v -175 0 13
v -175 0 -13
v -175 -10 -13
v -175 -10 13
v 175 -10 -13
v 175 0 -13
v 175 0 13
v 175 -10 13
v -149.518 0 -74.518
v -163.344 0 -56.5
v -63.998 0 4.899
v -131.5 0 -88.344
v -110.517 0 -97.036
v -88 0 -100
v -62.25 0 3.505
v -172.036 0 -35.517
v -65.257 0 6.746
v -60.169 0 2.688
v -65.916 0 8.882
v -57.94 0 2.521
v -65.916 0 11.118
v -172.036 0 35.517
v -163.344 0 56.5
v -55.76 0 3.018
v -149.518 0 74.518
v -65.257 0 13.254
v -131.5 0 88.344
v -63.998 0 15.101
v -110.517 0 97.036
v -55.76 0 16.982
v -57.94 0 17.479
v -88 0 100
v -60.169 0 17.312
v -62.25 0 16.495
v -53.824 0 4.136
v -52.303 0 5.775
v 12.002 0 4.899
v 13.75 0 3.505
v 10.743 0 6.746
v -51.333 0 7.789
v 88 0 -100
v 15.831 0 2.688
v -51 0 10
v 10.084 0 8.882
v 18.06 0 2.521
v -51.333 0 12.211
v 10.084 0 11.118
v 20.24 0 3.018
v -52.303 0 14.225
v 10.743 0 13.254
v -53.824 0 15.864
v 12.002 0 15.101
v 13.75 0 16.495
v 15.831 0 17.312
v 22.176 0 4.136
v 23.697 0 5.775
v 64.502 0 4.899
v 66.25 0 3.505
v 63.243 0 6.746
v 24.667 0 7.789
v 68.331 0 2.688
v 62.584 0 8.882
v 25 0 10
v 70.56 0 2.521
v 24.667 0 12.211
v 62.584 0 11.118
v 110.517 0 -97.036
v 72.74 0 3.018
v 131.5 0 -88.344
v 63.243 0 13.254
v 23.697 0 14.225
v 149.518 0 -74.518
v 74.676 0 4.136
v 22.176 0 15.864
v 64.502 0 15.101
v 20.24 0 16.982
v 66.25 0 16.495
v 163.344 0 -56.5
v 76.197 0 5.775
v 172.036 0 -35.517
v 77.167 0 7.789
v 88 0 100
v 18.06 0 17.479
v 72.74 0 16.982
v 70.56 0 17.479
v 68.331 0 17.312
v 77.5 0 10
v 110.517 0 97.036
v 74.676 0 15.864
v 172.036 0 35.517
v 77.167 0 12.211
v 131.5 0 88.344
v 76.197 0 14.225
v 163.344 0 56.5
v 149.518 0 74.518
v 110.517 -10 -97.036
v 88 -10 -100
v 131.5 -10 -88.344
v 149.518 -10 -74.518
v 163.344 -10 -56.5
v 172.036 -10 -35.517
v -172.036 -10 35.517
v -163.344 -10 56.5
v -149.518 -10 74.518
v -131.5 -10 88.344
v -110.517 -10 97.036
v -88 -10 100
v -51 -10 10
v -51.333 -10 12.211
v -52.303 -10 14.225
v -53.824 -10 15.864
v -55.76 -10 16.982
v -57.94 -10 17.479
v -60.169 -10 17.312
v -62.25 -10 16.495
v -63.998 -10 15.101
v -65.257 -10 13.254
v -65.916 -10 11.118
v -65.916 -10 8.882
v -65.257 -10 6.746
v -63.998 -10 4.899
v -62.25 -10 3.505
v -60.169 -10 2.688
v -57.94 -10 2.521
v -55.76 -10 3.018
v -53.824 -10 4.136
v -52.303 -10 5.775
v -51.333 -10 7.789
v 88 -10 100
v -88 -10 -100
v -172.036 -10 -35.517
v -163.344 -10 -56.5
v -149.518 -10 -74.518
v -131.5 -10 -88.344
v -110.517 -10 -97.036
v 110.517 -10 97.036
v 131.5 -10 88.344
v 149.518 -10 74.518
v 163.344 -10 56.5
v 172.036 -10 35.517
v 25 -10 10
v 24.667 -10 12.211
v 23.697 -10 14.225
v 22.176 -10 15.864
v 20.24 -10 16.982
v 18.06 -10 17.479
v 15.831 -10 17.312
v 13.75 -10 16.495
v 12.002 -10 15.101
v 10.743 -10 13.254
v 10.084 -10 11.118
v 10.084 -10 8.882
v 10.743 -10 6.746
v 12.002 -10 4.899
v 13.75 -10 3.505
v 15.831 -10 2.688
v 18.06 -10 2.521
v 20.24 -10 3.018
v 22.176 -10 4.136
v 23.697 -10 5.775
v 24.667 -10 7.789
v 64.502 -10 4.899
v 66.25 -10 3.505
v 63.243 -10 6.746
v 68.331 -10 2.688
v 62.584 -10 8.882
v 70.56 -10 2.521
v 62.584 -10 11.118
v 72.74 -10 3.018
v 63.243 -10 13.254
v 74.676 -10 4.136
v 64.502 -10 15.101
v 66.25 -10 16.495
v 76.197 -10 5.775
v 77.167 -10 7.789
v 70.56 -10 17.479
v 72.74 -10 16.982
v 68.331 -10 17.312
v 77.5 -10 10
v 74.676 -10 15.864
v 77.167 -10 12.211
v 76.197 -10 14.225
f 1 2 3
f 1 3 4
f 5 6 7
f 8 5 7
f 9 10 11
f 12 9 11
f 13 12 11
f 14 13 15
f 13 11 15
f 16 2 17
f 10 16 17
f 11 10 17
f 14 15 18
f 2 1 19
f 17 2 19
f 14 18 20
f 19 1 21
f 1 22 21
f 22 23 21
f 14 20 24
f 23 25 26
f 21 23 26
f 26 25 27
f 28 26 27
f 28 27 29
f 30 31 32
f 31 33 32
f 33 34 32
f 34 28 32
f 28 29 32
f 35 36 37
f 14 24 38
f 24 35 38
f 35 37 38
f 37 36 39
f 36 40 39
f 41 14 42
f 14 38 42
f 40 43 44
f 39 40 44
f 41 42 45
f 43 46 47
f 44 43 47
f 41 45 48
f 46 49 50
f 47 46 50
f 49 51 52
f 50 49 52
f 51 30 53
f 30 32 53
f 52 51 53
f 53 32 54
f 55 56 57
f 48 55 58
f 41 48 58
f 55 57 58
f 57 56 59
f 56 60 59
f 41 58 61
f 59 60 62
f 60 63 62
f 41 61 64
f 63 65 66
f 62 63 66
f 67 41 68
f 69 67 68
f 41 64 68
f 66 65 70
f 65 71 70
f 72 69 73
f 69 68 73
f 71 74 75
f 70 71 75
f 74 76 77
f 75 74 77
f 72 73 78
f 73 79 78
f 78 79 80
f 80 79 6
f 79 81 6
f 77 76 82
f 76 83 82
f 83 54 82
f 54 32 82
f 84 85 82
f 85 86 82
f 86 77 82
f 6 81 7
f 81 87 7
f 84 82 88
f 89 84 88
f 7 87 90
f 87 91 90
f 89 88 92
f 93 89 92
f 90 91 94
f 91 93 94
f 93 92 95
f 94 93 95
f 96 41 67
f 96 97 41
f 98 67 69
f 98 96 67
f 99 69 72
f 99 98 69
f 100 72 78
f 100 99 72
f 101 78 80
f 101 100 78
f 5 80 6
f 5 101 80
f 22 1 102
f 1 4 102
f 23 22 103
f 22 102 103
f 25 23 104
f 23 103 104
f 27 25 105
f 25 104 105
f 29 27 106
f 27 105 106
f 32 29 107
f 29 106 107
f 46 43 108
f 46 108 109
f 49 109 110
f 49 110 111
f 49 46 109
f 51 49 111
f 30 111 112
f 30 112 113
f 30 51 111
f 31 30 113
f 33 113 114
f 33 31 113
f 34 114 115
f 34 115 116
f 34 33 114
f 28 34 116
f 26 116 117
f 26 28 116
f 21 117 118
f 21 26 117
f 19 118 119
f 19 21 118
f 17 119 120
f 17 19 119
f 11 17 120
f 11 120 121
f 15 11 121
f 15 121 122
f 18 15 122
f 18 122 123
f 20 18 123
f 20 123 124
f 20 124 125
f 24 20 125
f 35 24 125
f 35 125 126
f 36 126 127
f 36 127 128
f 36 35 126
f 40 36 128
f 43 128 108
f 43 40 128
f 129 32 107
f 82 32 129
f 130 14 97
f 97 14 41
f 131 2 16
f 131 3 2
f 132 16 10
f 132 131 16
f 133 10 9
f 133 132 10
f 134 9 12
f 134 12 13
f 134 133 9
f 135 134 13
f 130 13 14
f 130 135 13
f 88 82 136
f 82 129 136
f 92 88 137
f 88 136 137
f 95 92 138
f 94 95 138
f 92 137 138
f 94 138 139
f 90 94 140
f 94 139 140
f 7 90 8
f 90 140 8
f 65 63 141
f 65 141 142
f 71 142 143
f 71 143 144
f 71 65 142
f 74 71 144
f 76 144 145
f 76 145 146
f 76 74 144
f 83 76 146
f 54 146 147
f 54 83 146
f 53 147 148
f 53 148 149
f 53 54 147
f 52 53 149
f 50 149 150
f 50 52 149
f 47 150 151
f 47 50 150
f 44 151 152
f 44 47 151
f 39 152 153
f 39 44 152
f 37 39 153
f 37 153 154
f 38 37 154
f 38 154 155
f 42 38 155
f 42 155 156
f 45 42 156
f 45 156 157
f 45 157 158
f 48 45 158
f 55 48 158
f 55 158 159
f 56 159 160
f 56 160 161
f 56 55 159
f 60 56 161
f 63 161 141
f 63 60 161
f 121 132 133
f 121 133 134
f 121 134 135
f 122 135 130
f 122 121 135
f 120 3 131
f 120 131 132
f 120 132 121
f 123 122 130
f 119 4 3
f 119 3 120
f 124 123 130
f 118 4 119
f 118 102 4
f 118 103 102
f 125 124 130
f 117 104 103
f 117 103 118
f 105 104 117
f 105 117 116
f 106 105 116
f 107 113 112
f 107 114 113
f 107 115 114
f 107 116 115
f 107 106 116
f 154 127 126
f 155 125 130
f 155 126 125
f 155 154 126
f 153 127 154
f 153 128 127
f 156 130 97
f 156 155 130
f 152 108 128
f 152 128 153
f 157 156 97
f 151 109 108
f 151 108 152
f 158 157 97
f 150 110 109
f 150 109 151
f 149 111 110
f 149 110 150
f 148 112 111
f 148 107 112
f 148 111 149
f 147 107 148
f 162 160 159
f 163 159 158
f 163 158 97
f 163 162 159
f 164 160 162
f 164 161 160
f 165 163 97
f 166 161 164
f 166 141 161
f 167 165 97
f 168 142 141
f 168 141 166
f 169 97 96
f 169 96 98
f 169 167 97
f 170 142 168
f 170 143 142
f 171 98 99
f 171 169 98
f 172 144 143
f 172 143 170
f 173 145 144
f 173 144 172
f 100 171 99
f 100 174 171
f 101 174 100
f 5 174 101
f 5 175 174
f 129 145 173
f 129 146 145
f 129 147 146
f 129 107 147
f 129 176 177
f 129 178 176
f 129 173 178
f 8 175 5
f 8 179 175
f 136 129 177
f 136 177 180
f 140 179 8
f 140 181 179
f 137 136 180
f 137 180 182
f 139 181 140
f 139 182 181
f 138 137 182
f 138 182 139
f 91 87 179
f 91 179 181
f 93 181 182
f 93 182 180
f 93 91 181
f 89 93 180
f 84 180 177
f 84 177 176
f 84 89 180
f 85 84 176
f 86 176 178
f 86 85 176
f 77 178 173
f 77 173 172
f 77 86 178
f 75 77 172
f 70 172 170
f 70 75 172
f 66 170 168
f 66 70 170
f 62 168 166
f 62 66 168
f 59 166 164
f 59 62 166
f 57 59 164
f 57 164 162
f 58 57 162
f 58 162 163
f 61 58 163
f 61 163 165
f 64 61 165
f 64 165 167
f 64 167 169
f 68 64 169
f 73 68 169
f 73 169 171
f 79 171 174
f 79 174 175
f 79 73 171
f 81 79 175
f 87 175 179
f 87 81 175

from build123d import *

# Parameters (mm, degrees)
F0_W     = 350
F0_H     = 200
F0_R     = 7.5
F1_DEPTH = 10
F2_R     = 87


with BuildPart() as f1:
    # F0 (on Front) → F1 (new body)
    with BuildSketch(Plane.XZ):
        Rectangle(F0_W, F0_H)
        with Locations((-58.5, 10)):
            Circle(F0_R, mode=Mode.SUBTRACT)
        with Locations((17.5, 10)):
            Circle(F0_R, mode=Mode.SUBTRACT)
        with Locations((70, 10)):
            Circle(F0_R, mode=Mode.SUBTRACT)
    extrude(amount=F1_DEPTH)

    # F2
    f2_edges = [f1.edges().sort_by_distance(p)[0] for p in [
        (175, -5, 100),
        (-175, -5, 100),
        (-175, -5, -100),
        (175, -5, -100),
    ]]
    fillet(f2_edges, radius=F2_R)


solid = f1.part
